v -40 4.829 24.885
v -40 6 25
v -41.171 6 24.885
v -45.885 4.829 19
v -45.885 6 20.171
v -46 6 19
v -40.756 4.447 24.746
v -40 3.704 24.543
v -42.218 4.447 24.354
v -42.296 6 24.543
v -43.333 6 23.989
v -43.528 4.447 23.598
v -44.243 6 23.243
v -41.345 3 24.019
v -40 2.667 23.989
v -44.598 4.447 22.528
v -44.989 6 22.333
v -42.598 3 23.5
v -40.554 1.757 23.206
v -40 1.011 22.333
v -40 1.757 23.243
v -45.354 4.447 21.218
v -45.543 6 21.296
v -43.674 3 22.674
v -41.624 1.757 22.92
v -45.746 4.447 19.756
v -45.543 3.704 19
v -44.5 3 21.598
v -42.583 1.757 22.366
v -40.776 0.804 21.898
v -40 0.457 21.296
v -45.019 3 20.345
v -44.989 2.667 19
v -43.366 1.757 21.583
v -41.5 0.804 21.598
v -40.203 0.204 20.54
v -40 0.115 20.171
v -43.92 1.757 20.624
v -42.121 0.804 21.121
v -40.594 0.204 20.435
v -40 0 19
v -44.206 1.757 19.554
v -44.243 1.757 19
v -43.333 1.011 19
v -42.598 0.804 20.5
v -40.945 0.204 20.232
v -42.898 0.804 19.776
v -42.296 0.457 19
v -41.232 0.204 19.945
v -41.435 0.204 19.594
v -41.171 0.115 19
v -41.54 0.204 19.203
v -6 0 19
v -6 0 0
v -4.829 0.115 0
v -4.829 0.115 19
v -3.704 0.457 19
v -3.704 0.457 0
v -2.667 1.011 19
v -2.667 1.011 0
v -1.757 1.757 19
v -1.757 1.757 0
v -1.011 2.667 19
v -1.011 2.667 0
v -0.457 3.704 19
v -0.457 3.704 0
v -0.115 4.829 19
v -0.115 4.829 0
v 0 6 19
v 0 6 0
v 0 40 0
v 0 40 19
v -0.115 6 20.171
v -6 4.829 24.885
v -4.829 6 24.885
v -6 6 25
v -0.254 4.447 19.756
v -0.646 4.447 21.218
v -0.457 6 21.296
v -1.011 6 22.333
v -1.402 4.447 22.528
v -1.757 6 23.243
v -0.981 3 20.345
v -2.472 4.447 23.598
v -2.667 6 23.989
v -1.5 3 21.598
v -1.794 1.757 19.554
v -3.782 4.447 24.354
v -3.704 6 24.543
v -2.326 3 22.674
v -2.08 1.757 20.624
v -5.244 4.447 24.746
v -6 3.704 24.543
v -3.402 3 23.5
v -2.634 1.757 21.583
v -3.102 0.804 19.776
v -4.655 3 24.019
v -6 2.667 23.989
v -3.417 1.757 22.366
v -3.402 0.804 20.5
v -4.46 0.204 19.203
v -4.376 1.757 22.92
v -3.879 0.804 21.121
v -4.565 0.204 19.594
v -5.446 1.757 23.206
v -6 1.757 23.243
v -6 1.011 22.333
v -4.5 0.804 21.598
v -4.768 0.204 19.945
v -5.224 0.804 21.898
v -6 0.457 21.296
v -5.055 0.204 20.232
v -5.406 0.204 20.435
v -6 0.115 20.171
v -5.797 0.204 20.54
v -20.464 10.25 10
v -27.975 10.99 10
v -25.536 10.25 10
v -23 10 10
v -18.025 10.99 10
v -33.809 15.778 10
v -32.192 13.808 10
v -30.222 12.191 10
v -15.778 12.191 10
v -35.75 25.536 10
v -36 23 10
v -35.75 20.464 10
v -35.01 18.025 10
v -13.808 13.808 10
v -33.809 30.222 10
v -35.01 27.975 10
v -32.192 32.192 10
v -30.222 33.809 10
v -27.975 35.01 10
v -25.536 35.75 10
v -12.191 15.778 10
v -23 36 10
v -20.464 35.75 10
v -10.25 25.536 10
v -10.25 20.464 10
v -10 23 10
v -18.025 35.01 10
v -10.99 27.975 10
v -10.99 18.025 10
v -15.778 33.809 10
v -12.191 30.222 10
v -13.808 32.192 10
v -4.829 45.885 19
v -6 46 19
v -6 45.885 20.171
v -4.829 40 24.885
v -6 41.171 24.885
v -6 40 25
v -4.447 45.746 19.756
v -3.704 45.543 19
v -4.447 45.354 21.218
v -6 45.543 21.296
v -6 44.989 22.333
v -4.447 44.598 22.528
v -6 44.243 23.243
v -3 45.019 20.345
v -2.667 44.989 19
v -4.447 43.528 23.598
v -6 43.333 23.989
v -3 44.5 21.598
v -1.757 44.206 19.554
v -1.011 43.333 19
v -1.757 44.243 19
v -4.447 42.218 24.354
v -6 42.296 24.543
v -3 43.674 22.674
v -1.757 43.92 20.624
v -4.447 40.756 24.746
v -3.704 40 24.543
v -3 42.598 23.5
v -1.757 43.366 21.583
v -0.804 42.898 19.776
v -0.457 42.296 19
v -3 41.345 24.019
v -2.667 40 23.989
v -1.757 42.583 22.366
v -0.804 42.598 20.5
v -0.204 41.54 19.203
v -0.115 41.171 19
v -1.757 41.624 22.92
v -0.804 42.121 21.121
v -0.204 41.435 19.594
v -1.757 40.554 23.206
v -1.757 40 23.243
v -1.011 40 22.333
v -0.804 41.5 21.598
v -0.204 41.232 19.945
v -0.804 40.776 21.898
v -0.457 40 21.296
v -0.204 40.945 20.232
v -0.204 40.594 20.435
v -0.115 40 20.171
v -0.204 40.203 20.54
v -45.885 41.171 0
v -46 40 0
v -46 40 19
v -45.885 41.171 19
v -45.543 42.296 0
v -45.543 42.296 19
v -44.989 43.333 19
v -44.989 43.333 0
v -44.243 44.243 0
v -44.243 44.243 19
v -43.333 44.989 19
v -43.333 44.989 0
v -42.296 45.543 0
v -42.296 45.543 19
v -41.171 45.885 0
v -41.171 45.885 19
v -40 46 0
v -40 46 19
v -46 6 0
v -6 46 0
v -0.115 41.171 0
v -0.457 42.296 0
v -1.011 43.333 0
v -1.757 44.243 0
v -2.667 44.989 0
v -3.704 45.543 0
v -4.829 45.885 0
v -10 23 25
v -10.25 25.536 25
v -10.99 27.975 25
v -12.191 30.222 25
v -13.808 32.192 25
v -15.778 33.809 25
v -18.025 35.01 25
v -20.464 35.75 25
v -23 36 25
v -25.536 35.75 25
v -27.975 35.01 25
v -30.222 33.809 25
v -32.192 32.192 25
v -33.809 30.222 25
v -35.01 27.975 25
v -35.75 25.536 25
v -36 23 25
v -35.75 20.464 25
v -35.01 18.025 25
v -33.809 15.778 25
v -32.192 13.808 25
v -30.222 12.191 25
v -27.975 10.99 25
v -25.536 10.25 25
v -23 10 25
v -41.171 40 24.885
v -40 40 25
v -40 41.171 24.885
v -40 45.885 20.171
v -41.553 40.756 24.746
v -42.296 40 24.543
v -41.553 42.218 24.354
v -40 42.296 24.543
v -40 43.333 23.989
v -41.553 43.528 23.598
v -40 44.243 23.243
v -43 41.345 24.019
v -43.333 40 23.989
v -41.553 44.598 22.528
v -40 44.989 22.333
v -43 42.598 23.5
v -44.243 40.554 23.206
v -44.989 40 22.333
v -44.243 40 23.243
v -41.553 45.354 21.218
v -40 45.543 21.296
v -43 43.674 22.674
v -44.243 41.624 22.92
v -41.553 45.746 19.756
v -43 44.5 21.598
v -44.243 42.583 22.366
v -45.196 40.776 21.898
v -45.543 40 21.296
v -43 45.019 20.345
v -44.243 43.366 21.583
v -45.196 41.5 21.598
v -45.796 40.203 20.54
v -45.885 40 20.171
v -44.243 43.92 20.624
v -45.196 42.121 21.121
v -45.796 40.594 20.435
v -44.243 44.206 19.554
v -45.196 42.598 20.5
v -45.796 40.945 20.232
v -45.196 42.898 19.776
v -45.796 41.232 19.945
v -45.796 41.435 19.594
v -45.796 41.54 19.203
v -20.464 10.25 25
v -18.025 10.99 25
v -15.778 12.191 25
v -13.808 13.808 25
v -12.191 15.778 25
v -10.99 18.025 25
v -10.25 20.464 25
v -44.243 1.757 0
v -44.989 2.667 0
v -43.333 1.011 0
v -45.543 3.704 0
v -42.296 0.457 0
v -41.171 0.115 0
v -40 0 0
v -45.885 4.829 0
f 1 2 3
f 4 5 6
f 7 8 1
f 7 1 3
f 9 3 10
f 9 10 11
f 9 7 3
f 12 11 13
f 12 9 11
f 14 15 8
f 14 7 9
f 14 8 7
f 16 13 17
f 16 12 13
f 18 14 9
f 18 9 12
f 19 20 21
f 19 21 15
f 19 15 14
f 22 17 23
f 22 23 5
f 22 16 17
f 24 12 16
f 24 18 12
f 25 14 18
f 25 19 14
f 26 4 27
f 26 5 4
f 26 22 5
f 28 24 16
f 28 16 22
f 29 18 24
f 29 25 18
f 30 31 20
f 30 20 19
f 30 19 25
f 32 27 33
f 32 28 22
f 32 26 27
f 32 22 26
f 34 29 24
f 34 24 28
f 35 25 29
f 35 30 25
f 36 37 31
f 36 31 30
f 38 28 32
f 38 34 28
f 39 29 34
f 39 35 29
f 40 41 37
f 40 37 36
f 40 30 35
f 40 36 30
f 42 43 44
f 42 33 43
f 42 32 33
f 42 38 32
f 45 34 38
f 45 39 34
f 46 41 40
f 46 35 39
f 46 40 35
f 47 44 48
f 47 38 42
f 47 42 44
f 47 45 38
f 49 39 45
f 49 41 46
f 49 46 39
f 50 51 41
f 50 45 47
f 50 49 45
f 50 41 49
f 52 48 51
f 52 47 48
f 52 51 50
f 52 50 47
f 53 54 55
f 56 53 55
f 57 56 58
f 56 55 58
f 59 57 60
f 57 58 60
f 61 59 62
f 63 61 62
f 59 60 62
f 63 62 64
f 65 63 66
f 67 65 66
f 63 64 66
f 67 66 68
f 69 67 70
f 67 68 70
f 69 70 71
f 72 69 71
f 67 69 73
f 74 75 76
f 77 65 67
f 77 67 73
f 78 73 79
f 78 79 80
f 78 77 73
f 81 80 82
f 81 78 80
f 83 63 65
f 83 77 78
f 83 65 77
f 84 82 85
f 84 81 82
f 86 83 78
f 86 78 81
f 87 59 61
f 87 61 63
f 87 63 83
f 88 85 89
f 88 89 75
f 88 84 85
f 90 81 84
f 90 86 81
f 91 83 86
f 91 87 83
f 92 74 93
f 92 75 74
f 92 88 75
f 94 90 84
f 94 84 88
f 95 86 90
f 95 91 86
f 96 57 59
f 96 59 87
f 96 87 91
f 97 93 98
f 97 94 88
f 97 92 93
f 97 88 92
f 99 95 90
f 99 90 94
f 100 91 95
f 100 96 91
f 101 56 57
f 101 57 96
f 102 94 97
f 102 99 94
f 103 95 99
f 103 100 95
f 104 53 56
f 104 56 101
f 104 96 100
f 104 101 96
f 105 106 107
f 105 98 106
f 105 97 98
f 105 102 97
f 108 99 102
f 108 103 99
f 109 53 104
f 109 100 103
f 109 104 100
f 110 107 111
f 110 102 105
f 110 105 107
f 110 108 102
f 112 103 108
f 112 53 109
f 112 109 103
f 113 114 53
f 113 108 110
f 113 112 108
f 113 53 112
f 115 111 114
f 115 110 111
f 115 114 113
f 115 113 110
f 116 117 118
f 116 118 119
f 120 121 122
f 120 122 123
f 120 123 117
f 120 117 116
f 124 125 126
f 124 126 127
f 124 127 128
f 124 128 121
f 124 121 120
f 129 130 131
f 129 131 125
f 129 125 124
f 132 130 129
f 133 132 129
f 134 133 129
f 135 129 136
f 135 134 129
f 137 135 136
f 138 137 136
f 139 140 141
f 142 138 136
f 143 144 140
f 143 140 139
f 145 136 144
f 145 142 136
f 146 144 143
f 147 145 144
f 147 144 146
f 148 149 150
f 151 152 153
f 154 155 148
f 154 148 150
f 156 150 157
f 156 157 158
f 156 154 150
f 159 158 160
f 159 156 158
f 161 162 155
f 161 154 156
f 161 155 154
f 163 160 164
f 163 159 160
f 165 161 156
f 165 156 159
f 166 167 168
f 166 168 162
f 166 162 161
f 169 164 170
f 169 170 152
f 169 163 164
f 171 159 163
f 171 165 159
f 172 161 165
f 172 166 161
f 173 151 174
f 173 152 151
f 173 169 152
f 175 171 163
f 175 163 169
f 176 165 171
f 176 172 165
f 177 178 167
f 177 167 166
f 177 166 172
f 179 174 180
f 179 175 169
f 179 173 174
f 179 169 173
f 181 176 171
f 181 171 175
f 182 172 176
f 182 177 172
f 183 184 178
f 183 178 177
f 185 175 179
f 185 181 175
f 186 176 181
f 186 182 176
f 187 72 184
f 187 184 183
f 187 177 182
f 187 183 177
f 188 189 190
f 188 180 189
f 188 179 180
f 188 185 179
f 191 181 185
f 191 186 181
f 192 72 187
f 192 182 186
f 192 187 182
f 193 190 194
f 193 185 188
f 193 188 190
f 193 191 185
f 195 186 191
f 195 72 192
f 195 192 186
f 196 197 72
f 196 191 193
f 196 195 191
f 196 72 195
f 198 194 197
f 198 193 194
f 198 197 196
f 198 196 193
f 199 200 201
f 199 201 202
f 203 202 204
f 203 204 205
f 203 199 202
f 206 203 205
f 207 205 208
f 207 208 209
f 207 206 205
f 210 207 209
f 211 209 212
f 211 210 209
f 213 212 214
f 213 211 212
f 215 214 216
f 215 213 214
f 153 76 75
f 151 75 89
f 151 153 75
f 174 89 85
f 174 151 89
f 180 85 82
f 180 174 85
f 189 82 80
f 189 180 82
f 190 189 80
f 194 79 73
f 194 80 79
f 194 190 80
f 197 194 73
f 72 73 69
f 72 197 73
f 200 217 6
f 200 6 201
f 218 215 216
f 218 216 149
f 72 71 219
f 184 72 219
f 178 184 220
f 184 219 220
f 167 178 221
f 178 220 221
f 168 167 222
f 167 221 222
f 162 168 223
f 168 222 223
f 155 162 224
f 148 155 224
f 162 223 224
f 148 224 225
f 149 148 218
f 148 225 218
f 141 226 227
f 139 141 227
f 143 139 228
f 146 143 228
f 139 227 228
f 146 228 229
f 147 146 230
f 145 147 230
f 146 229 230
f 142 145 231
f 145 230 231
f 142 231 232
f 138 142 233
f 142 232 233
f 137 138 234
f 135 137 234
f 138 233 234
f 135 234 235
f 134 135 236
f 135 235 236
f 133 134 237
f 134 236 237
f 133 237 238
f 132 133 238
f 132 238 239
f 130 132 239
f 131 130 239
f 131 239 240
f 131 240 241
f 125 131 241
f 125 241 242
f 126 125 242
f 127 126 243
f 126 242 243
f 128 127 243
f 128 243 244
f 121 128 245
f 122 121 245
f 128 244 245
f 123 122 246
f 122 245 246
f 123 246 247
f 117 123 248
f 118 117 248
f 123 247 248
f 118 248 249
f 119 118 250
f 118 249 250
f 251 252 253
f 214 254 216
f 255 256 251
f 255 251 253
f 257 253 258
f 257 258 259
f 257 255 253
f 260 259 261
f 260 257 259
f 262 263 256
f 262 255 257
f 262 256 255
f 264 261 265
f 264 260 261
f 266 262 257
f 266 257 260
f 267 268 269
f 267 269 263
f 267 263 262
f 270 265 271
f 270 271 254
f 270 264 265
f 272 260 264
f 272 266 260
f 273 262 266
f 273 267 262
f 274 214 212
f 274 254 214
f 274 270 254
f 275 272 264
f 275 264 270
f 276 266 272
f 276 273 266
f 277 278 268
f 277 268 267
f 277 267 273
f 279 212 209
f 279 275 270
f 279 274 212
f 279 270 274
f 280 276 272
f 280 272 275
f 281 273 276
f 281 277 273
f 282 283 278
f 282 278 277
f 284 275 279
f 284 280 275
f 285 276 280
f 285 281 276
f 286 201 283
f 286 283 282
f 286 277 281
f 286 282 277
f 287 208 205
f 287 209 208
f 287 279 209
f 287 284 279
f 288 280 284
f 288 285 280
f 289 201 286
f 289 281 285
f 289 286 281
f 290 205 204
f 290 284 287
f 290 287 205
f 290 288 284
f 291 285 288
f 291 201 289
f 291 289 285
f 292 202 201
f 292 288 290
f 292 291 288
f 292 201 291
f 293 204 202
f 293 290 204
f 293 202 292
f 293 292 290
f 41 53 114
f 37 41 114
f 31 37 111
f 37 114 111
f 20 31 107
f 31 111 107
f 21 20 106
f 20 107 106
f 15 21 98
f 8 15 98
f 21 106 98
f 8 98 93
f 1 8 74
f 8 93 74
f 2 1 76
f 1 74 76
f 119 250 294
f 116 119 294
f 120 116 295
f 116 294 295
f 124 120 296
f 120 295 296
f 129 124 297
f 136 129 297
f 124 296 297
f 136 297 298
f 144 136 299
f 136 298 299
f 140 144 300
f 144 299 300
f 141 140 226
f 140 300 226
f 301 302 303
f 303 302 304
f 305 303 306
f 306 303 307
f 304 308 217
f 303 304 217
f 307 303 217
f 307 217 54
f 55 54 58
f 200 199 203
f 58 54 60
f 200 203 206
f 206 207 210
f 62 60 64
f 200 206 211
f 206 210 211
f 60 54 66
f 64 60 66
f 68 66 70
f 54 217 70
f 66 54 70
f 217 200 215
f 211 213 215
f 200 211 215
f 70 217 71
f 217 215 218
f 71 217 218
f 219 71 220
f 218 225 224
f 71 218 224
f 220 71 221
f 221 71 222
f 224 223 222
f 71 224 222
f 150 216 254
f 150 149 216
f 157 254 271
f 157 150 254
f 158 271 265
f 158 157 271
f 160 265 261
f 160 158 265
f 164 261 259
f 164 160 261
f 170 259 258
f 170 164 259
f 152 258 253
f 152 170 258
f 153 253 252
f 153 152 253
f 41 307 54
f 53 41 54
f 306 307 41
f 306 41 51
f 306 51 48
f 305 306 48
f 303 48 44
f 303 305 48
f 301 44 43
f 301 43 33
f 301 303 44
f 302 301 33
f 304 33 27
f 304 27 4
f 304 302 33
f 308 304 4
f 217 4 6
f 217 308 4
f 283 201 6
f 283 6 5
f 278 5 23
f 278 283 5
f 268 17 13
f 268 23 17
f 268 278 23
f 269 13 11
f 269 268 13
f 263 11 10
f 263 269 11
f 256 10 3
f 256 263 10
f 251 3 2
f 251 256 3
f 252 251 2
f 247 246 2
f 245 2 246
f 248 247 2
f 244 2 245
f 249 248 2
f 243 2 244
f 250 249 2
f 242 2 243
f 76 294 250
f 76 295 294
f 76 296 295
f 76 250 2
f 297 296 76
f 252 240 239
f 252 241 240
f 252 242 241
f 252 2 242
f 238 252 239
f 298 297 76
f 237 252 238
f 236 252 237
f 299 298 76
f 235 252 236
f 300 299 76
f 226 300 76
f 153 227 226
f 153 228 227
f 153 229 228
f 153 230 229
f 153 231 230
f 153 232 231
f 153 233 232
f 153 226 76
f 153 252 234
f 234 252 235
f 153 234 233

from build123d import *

# Parameters (mm, degrees)
F0_W         = 46
F0_H         = 46
F1_DEPTH     = 25
F3_DEPTH     = 15
F4_R         = 6
F5_T1_DEPTH  = 34
F5_S5_W      = 6
F5_S5_H      = 6
F5_T6_DEPTH  = 6
F5_S11_W     = 6
F5_S11_H     = 6
F5_T12_DEPTH = 6
F5_S17_W     = 6
F5_S17_H     = 6
F5_T18_DEPTH = 6
F5_S23_W     = 6
F5_S23_H     = 6
F5_T24_DEPTH = 6


# Not quite as in the source:
# - a fillet or chamfer that OpenCascade refuses, or shapes differently, is made with other operations: its cross-section is extruded or revolved along the edge and cut away or added


with BuildPart() as f1:
    # F0 (on Top) → F1 (new body)
    with BuildSketch(Plane.XY):
        with Locations((-23, 23)):
            Rectangle(F0_W, F0_H)
    extrude(amount=F1_DEPTH)

    # F2 (on face) → F3 (cut)
    with BuildSketch(Plane.XY.offset(25)):
        with BuildLine():
            ThreePointArc((-10, 23), (-32.1923881554, 32.1923881554), (-23, 10))
            ThreePointArc((-23, 10), (-13.8076118446, 13.8076118446), (-10, 23))
        make_face()
    extrude(amount=-F3_DEPTH, mode=Mode.SUBTRACT)

    # F4
    f4_edges = [f1.edges().sort_by_distance(p)[0] for p in [
        (-23, 0, 25),
        (-46, 23, 25),
        (0, 23, 25),
        (-23, 46, 25),
    ]]
    fillet(f4_edges, radius=F4_R)

    # F5: fillet of radius 6 on 4 edges, made by hand

    # F5_s2 → F5_t1 (cut)
    with BuildSketch(Plane.XY.offset(-15)):
        with BuildLine():
            ThreePointArc((-40, 0), (-44.2426406871, 1.7573593129), (-46, 6))
            Line((-46, 6), (-46, 0))
            Line((-46, 0), (-40, 0))
        make_face()
        with BuildLine():
            ThreePointArc((-6, 0), (-1.7573593129, 1.7573593129), (0, 6))
            Line((0, 6), (0, 0))
            Line((0, 0), (-6, 0))
        make_face()
        with BuildLine():
            ThreePointArc((0, 40), (-1.7573593129, 44.2426406871), (-6, 46))
            Line((-6, 46), (0, 46))
            Line((0, 46), (0, 40))
        make_face()
        with BuildLine():
            ThreePointArc((-46, 40), (-44.2426406871, 44.2426406871), (-40, 46))
            Line((-40, 46), (-46, 46))
            Line((-46, 46), (-46, 40))
        make_face()
    extrude(amount=F5_T1_DEPTH, mode=Mode.SUBTRACT)


with BuildPart() as f5_tool4:
    # F5_s5 → F5_t6 (new body)
    with BuildSketch(Plane.YZ.offset(-40)):
        with Locations((43, 22)):
            Rectangle(F5_S5_W, F5_S5_H)
    extrude(amount=-F5_T6_DEPTH)

    # F5_s7 → F5_t8 (revolve, cut)
    with BuildSketch(Plane(origin=(-40, 40, 19), x_dir=(0, -0.7071067812, -0.7071067812), z_dir=(0, 0.7071067812, -0.7071067812))):
        with BuildLine():
            ThreePointArc((0, -6), (6, 0), (0, 6))
            Line((0, 6), (0, -6))
        make_face()
    revolve(axis=Axis((-40, 40, 19), (-1, 0, 0)), mode=Mode.SUBTRACT)


with BuildPart() as f1_1:
    add(f1.part)

    # F5_t3: cut F5_tool4
    add(f5_tool4.part, mode=Mode.SUBTRACT)


with BuildPart() as f5_tool10:
    # F5_s11 → F5_t12 (new body)
    with BuildSketch(Plane.YZ.offset(-6)):
        with Locations((43, 22)):
            Rectangle(F5_S11_W, F5_S11_H)
    extrude(amount=F5_T12_DEPTH)

    # F5_s13 → F5_t14 (revolve, cut)
    with BuildSketch(Plane(origin=(-6, 40, 19), x_dir=(0, -0.7071067812, -0.7071067812), z_dir=(0, -0.7071067812, 0.7071067812))):
        with BuildLine():
            ThreePointArc((0, -6), (6, 0), (0, 6))
            Line((0, 6), (0, -6))
        make_face()
    revolve(axis=Axis((-6, 40, 19), (1, 0, 0)), mode=Mode.SUBTRACT)


with BuildPart() as f1_2:
    add(f1_1.part)

    # F5_t9: cut F5_tool10
    add(f5_tool10.part, mode=Mode.SUBTRACT)


with BuildPart() as f5_tool16:
    # F5_s17 → F5_t18 (new body)
    with BuildSketch(Plane.XZ.offset(-6)):
        with Locations((-3, 22)):
            Rectangle(F5_S17_W, F5_S17_H)
    extrude(amount=F5_T18_DEPTH)

    # F5_s19 → F5_t20 (revolve, cut)
    with BuildSketch(Plane(origin=(-6, 6, 19), x_dir=(-0.7071067812, 0, -0.7071067812), z_dir=(-0.7071067812, 0, 0.7071067812))):
        with BuildLine():
            ThreePointArc((0, -6), (6, 0), (0, 6))
            Line((0, 6), (0, -6))
        make_face()
    revolve(axis=Axis((-6, 6, 19), (0, -1, 0)), mode=Mode.SUBTRACT)


with BuildPart() as f1_3:
    add(f1_2.part)

    # F5_t15: cut F5_tool16
    add(f5_tool16.part, mode=Mode.SUBTRACT)


with BuildPart() as f5_tool22:
    # F5_s23 → F5_t24 (new body)
    with BuildSketch(Plane.XZ.offset(-6)):
        with Locations((-43, 22)):
            Rectangle(F5_S23_W, F5_S23_H)
    extrude(amount=F5_T24_DEPTH)

    # F5_s25 → F5_t26 (revolve, cut)
    with BuildSketch(Plane(origin=(-40, 6, 19), x_dir=(0.7071067812, 0, -0.7071067812), z_dir=(-0.7071067812, 0, -0.7071067812))):
        with BuildLine():
            ThreePointArc((0, -6), (6, 0), (0, 6))
            Line((0, 6), (0, -6))
        make_face()
    revolve(axis=Axis((-40, 6, 19), (0, -1, 0)), mode=Mode.SUBTRACT)


with BuildPart() as f1_4:
    add(f1_3.part)

    # F5_t21: cut F5_tool22
    add(f5_tool22.part, mode=Mode.SUBTRACT)


solid = f1_4.part
